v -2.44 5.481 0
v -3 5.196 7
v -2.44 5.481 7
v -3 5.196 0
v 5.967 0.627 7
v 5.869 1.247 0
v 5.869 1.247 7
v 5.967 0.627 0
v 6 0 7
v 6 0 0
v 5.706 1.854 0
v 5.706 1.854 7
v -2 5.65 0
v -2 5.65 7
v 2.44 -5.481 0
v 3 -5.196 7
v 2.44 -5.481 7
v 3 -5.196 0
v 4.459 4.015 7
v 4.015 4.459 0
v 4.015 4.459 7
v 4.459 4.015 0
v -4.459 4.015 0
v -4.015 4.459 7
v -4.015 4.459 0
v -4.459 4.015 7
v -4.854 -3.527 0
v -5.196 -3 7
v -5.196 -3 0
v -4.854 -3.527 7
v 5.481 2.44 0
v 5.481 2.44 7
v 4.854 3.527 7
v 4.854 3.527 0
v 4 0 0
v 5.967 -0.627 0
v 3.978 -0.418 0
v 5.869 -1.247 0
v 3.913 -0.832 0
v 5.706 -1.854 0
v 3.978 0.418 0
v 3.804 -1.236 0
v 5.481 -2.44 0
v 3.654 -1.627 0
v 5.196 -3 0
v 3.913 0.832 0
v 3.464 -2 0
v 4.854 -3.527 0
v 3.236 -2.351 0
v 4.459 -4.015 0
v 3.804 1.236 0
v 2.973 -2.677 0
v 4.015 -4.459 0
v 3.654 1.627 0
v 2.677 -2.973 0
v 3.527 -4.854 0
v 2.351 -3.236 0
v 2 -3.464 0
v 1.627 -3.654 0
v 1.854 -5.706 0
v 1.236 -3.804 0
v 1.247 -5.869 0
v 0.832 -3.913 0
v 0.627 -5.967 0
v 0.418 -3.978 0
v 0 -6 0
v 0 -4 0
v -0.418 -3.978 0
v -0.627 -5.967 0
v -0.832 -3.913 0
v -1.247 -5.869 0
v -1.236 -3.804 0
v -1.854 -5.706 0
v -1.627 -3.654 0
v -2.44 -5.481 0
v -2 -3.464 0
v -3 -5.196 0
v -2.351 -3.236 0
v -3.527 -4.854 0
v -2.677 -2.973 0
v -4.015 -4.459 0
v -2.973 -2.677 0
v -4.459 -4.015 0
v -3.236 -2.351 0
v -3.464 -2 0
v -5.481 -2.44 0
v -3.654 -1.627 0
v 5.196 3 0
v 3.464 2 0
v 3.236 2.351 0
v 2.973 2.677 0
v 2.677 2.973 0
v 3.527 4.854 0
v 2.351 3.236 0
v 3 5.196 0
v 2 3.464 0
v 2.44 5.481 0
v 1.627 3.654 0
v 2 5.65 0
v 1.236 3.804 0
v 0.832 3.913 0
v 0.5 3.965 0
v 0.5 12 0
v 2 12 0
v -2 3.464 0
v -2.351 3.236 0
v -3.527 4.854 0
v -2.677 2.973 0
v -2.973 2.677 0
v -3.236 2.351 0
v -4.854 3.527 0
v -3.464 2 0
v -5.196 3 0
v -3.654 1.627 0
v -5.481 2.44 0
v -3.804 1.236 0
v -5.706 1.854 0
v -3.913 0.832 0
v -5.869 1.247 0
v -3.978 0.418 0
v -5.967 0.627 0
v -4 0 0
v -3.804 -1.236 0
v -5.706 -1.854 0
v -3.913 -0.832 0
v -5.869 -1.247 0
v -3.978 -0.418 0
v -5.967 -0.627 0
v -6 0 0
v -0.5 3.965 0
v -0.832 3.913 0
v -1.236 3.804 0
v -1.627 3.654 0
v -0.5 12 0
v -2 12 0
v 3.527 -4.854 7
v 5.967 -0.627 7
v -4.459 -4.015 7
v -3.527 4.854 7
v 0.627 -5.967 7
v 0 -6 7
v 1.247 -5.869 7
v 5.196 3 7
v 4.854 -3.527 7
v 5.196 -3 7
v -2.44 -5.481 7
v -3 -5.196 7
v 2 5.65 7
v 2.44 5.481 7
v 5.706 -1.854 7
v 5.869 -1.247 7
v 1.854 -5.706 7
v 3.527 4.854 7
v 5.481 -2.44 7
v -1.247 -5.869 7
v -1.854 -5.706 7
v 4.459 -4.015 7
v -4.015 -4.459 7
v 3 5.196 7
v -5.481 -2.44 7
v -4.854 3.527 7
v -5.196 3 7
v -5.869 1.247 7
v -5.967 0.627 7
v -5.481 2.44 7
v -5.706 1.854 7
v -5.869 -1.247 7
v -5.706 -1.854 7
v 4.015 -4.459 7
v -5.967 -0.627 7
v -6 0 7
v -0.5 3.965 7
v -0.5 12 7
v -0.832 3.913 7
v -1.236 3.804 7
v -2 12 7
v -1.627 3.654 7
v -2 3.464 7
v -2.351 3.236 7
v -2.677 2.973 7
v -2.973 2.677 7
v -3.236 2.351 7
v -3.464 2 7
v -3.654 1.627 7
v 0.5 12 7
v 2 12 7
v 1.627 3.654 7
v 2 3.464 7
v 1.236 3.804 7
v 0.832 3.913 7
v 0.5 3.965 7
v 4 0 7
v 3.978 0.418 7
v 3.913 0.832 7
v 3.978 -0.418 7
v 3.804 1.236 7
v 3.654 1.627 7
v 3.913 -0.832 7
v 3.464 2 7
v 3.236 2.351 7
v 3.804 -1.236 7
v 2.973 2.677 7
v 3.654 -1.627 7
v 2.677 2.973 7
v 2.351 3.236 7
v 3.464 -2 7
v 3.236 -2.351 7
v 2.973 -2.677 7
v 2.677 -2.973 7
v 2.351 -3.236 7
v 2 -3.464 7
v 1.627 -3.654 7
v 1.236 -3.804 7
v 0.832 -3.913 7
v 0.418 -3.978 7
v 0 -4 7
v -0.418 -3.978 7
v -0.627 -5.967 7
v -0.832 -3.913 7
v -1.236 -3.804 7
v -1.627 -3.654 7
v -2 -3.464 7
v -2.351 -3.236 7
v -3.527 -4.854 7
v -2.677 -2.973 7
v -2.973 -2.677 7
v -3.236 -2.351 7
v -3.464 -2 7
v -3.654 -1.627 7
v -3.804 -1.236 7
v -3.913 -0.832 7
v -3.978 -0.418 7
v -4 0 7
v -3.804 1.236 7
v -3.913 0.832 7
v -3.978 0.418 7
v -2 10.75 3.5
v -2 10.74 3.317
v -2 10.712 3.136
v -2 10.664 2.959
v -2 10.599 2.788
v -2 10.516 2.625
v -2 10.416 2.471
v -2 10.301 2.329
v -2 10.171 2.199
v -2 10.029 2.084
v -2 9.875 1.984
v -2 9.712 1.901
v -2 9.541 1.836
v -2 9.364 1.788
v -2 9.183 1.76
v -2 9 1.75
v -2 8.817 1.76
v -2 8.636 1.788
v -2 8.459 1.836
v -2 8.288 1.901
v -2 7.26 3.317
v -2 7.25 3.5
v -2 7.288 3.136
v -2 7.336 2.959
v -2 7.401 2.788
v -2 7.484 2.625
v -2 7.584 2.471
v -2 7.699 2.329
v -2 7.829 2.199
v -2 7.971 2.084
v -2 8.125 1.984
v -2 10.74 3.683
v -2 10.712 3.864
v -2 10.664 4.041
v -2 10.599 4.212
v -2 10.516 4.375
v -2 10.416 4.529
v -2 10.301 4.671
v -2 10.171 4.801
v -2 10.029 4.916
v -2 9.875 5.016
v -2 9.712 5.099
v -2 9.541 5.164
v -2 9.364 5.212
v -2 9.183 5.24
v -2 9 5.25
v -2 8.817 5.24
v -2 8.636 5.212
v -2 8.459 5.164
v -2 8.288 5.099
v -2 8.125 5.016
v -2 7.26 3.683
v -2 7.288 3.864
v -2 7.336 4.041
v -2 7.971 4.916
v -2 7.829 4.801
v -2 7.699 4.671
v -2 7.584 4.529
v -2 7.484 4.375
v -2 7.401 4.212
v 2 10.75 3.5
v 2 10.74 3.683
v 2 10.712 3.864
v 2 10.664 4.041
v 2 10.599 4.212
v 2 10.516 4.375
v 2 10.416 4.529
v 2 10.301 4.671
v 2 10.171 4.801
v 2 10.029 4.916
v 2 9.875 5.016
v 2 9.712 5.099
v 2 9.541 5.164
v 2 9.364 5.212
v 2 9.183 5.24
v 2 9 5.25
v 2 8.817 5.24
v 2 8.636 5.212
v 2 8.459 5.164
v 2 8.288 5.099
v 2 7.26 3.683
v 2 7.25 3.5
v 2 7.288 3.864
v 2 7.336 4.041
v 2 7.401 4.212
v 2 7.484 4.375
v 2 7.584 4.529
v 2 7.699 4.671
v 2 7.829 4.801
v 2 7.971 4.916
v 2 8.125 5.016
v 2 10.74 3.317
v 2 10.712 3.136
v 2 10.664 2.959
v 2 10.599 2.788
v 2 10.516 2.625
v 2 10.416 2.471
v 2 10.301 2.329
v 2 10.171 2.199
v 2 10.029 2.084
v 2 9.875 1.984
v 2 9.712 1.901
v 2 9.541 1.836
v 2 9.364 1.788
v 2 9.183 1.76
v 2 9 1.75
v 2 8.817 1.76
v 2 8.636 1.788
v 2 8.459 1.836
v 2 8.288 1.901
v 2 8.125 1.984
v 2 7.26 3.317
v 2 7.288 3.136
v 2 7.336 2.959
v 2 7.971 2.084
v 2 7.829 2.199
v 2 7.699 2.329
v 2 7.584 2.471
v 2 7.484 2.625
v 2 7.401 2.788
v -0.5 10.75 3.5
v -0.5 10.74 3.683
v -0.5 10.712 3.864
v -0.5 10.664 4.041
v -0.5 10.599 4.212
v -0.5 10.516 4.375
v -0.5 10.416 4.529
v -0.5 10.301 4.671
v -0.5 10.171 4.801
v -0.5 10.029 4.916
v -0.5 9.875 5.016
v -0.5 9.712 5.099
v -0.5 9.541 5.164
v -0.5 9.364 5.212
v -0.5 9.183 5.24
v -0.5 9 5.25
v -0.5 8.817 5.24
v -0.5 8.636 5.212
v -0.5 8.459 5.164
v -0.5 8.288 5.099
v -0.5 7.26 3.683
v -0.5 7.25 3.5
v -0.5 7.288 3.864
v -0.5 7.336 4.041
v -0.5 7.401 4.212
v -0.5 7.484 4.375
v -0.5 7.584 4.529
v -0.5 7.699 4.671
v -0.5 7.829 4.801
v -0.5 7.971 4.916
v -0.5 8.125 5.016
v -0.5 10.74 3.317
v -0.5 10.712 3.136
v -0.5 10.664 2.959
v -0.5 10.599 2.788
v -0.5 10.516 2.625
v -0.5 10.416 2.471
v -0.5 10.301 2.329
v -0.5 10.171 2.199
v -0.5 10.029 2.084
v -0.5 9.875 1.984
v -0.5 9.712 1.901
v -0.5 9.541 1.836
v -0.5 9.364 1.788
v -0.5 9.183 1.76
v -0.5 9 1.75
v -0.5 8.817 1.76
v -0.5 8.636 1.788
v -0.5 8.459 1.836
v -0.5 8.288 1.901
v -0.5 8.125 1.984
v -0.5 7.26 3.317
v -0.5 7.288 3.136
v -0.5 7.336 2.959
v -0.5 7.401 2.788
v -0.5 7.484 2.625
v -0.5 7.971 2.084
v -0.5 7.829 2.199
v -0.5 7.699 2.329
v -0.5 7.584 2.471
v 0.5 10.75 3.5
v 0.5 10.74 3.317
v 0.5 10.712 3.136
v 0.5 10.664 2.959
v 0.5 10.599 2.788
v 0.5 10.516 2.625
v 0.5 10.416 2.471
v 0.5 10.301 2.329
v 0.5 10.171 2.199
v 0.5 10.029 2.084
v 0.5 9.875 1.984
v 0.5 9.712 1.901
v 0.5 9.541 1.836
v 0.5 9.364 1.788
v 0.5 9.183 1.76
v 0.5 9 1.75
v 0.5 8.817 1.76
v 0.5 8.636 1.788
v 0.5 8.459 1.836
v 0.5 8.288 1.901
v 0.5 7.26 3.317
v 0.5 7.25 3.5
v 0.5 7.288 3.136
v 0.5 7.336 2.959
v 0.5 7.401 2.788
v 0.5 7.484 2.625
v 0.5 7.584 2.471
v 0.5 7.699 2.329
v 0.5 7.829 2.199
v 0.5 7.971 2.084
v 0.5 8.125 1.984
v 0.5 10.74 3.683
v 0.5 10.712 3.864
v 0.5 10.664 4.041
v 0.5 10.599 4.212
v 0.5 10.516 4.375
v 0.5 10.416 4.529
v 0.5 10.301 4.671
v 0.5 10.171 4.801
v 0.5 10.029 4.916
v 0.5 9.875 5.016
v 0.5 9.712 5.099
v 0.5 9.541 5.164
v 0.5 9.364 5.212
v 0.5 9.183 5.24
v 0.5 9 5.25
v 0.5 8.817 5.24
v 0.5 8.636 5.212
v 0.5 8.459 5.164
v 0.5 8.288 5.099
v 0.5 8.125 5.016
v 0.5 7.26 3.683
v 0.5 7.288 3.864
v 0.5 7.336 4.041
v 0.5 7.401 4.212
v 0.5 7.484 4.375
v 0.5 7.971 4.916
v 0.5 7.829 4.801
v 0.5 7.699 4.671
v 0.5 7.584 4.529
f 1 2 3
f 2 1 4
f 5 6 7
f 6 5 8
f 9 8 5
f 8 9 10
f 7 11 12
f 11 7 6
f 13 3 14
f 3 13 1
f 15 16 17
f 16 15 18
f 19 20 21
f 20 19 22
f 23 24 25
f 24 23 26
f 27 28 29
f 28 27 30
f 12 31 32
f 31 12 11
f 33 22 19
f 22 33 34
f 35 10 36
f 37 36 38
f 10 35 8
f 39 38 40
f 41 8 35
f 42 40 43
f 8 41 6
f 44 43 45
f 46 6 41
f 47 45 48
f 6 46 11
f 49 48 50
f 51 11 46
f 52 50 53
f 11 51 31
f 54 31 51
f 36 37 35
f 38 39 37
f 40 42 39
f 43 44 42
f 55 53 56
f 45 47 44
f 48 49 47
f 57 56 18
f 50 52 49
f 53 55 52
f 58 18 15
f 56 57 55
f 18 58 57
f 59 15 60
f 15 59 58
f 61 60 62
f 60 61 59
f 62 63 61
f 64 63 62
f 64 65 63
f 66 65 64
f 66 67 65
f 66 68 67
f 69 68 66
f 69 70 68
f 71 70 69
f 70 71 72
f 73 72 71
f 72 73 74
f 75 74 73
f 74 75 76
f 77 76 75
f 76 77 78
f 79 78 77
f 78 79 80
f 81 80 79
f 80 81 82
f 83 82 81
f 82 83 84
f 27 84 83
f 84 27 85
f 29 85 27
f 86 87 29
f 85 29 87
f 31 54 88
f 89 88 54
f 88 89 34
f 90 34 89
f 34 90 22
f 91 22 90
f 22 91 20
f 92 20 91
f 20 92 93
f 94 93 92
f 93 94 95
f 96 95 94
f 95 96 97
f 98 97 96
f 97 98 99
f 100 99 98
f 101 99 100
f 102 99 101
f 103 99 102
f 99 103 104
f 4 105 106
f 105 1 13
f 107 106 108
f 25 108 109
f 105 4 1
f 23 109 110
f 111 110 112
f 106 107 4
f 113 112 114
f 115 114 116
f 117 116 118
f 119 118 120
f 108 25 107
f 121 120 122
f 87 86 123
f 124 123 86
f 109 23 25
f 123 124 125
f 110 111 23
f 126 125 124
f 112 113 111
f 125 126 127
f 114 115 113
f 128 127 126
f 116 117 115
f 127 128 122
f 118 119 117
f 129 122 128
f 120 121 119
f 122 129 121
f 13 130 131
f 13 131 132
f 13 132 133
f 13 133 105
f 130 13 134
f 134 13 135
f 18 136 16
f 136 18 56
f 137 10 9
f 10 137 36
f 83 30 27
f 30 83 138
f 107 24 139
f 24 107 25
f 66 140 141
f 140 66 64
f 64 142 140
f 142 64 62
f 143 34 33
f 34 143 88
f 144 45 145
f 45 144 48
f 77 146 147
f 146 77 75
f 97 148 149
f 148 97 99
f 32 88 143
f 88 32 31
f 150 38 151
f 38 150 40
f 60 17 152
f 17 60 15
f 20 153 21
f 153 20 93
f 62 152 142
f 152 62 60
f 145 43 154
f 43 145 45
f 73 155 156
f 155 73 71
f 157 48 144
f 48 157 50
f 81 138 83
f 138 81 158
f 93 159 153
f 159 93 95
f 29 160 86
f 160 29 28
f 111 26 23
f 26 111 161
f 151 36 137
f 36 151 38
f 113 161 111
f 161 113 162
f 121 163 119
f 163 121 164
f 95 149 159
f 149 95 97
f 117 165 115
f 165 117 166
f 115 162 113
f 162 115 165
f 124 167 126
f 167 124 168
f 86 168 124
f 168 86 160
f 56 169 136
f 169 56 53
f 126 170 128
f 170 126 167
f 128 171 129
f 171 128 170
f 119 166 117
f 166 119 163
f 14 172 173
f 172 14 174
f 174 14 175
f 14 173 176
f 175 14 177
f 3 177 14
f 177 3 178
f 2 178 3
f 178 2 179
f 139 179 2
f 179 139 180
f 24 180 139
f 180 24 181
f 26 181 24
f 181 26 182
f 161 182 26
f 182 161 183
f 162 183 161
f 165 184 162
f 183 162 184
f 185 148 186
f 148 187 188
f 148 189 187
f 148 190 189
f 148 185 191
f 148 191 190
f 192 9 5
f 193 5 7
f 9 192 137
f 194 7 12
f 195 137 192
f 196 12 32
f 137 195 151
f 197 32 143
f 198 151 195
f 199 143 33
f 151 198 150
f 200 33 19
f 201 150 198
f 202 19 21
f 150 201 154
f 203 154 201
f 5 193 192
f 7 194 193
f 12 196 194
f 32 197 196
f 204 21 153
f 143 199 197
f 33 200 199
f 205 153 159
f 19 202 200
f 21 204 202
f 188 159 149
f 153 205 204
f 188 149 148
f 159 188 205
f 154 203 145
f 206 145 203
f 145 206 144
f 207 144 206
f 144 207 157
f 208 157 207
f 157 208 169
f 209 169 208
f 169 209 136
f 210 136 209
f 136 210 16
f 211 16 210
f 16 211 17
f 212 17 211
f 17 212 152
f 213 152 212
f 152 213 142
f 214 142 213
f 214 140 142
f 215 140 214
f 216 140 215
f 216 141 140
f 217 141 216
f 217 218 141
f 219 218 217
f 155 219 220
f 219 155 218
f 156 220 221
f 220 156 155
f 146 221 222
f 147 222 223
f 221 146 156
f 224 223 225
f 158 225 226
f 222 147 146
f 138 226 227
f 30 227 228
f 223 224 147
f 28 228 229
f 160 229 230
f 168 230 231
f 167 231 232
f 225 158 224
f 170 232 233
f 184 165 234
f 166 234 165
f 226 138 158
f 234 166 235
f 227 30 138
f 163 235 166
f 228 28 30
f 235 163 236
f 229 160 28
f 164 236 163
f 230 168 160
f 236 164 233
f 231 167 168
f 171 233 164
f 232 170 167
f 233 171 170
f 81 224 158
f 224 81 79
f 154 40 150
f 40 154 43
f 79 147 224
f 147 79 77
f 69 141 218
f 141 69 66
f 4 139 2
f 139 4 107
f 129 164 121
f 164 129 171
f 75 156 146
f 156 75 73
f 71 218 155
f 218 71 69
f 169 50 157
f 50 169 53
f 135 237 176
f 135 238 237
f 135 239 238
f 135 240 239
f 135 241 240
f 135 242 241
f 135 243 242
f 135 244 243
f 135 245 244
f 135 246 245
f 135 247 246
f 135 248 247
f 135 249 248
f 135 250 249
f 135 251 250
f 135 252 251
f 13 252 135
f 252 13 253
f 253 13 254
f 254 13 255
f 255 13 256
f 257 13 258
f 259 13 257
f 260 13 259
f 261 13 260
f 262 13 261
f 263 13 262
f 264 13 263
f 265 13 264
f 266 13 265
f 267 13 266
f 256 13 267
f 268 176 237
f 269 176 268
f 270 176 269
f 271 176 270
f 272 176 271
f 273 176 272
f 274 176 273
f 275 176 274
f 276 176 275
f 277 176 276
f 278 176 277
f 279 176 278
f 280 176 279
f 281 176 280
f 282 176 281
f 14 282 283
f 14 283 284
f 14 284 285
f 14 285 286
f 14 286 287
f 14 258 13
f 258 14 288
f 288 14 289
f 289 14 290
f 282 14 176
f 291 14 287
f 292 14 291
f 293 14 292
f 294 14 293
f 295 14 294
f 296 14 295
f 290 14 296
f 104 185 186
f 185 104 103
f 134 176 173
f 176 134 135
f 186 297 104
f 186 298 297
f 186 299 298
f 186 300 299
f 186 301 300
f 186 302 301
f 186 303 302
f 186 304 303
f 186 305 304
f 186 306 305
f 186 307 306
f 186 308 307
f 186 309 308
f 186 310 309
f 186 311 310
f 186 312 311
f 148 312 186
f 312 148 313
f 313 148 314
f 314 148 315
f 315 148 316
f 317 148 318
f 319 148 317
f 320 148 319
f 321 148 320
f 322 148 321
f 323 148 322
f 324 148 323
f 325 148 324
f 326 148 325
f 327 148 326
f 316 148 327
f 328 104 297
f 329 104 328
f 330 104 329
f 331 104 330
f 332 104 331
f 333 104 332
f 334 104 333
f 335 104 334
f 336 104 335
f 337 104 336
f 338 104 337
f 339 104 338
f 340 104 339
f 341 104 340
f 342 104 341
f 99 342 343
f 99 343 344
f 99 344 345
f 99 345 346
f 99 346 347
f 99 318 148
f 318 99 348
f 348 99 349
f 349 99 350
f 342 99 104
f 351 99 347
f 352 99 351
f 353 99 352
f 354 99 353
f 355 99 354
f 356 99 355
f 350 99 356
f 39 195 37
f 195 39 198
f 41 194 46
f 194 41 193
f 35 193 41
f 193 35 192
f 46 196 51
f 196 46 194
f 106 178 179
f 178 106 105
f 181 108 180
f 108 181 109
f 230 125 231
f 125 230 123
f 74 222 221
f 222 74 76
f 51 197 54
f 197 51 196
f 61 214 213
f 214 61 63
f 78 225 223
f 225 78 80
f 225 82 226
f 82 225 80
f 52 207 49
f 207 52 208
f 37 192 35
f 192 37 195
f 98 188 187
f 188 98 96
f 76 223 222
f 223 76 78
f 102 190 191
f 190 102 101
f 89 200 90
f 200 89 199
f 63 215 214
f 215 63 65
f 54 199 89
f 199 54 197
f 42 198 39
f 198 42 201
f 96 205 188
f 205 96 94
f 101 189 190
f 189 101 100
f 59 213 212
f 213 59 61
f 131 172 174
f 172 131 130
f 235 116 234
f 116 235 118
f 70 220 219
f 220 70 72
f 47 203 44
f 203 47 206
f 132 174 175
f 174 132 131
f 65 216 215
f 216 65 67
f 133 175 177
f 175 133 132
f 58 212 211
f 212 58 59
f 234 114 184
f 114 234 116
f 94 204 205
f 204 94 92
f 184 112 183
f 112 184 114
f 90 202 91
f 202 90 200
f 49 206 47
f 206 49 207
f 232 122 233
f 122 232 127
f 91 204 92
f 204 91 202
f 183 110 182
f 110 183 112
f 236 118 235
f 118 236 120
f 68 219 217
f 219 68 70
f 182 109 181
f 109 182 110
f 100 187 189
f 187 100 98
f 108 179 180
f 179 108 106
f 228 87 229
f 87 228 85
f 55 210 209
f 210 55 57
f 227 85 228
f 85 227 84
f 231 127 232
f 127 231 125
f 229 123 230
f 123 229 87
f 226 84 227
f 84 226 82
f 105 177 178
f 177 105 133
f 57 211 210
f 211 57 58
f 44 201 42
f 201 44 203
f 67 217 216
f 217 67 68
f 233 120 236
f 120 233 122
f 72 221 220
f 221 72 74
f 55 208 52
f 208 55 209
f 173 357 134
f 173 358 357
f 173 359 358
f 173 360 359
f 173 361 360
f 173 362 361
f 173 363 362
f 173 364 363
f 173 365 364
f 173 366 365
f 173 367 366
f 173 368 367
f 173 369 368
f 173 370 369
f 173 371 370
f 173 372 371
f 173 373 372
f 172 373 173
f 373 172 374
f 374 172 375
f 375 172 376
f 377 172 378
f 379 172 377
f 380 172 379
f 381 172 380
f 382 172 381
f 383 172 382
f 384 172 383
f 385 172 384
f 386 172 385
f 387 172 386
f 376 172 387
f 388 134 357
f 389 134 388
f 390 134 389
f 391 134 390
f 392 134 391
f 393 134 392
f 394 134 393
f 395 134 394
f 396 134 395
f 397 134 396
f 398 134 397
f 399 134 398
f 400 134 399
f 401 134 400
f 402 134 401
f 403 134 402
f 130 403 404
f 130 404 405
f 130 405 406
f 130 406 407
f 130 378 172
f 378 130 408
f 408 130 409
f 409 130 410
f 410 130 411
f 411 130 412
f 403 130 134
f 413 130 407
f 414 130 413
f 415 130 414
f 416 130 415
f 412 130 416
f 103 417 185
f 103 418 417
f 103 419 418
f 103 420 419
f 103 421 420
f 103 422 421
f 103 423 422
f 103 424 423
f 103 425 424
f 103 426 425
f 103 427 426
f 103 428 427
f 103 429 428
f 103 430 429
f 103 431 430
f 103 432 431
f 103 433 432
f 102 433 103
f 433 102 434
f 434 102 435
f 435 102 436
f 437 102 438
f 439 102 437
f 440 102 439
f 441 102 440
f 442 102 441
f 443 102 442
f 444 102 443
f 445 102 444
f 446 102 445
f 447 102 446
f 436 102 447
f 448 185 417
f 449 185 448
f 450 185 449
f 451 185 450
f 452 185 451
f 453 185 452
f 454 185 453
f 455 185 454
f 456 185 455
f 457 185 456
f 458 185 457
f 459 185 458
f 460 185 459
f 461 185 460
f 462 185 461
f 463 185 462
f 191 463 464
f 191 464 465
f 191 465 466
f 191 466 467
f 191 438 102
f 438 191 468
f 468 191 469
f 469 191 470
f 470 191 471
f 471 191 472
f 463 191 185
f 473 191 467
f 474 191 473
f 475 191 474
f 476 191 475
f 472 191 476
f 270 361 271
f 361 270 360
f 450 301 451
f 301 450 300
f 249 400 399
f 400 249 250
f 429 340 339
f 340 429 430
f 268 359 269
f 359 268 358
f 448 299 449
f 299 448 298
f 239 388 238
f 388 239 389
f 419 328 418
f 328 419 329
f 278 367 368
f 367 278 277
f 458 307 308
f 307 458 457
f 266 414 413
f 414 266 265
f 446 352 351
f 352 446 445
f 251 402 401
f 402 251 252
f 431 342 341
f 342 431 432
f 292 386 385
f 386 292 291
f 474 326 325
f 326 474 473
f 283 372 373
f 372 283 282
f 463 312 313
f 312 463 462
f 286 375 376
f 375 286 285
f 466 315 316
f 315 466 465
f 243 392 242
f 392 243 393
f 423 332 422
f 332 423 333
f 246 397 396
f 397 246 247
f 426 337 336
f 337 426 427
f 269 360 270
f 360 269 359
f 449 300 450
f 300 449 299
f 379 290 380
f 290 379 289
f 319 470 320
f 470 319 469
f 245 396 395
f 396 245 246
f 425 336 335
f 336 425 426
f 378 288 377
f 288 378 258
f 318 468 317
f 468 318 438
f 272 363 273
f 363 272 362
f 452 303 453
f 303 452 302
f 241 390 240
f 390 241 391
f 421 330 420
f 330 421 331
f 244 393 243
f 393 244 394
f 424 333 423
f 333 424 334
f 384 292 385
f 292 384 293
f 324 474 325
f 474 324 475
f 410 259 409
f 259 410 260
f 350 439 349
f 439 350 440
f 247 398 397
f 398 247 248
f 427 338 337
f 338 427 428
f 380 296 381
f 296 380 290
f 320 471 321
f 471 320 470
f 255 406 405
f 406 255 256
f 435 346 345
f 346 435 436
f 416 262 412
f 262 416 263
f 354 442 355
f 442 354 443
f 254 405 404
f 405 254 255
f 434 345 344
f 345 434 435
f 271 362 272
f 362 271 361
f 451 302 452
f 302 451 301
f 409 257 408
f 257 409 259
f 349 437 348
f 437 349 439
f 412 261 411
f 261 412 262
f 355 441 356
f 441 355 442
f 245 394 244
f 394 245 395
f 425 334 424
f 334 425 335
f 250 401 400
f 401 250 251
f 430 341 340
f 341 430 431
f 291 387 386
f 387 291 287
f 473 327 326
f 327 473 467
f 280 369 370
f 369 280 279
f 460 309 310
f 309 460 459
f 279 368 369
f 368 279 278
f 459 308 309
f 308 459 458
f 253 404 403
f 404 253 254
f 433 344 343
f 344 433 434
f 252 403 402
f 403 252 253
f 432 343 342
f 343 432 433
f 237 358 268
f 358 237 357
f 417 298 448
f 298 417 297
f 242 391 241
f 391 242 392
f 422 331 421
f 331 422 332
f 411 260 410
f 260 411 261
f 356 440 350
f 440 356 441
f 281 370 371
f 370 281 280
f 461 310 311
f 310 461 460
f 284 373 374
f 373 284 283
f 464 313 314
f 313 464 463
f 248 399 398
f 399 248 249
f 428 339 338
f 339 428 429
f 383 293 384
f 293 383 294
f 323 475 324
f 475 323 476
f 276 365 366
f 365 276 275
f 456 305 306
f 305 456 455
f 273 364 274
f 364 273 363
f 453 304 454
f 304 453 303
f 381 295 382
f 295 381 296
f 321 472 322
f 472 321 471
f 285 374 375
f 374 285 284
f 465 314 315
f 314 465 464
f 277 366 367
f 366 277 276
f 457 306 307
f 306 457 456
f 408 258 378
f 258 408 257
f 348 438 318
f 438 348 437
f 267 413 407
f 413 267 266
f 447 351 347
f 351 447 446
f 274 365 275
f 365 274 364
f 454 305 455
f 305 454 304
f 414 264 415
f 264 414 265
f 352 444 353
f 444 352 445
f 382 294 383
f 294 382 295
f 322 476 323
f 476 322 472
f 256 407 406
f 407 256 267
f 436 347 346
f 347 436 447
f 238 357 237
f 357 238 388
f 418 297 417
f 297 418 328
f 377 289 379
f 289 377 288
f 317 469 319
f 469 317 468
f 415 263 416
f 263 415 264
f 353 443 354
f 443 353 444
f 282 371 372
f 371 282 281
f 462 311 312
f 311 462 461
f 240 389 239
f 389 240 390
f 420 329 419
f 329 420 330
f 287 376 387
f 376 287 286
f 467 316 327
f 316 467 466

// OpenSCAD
shaft_size=8;
thickness=2;
width=7;
screw_diameter=3.5;
tab_length=6;

shaft_collar();

module shaft_collar() {
  $fn=60;
  difference() {
    union() {
      cylinder(d=shaft_size+thickness*2,h=width);
      linear_extrude(width)      
        translate([-thickness,0,0])
          square([thickness*2,shaft_size/2+thickness+tab_length]);
    }
    translate([0,0,-1])
      cylinder(d=shaft_size,h=width+2);    
    
    cut_size=1;
    linear_extrude(width+1)
      translate([-cut_size/2,0,0])
        square([cut_size,shaft_size/2+thickness+tab_length]);      
    
    translate([-thickness*2,shaft_size/2+thickness+(tab_length/2),width/2])
      rotate([0,90,0])
        cylinder(d=screw_diameter,thickness*4);
  }  
}
